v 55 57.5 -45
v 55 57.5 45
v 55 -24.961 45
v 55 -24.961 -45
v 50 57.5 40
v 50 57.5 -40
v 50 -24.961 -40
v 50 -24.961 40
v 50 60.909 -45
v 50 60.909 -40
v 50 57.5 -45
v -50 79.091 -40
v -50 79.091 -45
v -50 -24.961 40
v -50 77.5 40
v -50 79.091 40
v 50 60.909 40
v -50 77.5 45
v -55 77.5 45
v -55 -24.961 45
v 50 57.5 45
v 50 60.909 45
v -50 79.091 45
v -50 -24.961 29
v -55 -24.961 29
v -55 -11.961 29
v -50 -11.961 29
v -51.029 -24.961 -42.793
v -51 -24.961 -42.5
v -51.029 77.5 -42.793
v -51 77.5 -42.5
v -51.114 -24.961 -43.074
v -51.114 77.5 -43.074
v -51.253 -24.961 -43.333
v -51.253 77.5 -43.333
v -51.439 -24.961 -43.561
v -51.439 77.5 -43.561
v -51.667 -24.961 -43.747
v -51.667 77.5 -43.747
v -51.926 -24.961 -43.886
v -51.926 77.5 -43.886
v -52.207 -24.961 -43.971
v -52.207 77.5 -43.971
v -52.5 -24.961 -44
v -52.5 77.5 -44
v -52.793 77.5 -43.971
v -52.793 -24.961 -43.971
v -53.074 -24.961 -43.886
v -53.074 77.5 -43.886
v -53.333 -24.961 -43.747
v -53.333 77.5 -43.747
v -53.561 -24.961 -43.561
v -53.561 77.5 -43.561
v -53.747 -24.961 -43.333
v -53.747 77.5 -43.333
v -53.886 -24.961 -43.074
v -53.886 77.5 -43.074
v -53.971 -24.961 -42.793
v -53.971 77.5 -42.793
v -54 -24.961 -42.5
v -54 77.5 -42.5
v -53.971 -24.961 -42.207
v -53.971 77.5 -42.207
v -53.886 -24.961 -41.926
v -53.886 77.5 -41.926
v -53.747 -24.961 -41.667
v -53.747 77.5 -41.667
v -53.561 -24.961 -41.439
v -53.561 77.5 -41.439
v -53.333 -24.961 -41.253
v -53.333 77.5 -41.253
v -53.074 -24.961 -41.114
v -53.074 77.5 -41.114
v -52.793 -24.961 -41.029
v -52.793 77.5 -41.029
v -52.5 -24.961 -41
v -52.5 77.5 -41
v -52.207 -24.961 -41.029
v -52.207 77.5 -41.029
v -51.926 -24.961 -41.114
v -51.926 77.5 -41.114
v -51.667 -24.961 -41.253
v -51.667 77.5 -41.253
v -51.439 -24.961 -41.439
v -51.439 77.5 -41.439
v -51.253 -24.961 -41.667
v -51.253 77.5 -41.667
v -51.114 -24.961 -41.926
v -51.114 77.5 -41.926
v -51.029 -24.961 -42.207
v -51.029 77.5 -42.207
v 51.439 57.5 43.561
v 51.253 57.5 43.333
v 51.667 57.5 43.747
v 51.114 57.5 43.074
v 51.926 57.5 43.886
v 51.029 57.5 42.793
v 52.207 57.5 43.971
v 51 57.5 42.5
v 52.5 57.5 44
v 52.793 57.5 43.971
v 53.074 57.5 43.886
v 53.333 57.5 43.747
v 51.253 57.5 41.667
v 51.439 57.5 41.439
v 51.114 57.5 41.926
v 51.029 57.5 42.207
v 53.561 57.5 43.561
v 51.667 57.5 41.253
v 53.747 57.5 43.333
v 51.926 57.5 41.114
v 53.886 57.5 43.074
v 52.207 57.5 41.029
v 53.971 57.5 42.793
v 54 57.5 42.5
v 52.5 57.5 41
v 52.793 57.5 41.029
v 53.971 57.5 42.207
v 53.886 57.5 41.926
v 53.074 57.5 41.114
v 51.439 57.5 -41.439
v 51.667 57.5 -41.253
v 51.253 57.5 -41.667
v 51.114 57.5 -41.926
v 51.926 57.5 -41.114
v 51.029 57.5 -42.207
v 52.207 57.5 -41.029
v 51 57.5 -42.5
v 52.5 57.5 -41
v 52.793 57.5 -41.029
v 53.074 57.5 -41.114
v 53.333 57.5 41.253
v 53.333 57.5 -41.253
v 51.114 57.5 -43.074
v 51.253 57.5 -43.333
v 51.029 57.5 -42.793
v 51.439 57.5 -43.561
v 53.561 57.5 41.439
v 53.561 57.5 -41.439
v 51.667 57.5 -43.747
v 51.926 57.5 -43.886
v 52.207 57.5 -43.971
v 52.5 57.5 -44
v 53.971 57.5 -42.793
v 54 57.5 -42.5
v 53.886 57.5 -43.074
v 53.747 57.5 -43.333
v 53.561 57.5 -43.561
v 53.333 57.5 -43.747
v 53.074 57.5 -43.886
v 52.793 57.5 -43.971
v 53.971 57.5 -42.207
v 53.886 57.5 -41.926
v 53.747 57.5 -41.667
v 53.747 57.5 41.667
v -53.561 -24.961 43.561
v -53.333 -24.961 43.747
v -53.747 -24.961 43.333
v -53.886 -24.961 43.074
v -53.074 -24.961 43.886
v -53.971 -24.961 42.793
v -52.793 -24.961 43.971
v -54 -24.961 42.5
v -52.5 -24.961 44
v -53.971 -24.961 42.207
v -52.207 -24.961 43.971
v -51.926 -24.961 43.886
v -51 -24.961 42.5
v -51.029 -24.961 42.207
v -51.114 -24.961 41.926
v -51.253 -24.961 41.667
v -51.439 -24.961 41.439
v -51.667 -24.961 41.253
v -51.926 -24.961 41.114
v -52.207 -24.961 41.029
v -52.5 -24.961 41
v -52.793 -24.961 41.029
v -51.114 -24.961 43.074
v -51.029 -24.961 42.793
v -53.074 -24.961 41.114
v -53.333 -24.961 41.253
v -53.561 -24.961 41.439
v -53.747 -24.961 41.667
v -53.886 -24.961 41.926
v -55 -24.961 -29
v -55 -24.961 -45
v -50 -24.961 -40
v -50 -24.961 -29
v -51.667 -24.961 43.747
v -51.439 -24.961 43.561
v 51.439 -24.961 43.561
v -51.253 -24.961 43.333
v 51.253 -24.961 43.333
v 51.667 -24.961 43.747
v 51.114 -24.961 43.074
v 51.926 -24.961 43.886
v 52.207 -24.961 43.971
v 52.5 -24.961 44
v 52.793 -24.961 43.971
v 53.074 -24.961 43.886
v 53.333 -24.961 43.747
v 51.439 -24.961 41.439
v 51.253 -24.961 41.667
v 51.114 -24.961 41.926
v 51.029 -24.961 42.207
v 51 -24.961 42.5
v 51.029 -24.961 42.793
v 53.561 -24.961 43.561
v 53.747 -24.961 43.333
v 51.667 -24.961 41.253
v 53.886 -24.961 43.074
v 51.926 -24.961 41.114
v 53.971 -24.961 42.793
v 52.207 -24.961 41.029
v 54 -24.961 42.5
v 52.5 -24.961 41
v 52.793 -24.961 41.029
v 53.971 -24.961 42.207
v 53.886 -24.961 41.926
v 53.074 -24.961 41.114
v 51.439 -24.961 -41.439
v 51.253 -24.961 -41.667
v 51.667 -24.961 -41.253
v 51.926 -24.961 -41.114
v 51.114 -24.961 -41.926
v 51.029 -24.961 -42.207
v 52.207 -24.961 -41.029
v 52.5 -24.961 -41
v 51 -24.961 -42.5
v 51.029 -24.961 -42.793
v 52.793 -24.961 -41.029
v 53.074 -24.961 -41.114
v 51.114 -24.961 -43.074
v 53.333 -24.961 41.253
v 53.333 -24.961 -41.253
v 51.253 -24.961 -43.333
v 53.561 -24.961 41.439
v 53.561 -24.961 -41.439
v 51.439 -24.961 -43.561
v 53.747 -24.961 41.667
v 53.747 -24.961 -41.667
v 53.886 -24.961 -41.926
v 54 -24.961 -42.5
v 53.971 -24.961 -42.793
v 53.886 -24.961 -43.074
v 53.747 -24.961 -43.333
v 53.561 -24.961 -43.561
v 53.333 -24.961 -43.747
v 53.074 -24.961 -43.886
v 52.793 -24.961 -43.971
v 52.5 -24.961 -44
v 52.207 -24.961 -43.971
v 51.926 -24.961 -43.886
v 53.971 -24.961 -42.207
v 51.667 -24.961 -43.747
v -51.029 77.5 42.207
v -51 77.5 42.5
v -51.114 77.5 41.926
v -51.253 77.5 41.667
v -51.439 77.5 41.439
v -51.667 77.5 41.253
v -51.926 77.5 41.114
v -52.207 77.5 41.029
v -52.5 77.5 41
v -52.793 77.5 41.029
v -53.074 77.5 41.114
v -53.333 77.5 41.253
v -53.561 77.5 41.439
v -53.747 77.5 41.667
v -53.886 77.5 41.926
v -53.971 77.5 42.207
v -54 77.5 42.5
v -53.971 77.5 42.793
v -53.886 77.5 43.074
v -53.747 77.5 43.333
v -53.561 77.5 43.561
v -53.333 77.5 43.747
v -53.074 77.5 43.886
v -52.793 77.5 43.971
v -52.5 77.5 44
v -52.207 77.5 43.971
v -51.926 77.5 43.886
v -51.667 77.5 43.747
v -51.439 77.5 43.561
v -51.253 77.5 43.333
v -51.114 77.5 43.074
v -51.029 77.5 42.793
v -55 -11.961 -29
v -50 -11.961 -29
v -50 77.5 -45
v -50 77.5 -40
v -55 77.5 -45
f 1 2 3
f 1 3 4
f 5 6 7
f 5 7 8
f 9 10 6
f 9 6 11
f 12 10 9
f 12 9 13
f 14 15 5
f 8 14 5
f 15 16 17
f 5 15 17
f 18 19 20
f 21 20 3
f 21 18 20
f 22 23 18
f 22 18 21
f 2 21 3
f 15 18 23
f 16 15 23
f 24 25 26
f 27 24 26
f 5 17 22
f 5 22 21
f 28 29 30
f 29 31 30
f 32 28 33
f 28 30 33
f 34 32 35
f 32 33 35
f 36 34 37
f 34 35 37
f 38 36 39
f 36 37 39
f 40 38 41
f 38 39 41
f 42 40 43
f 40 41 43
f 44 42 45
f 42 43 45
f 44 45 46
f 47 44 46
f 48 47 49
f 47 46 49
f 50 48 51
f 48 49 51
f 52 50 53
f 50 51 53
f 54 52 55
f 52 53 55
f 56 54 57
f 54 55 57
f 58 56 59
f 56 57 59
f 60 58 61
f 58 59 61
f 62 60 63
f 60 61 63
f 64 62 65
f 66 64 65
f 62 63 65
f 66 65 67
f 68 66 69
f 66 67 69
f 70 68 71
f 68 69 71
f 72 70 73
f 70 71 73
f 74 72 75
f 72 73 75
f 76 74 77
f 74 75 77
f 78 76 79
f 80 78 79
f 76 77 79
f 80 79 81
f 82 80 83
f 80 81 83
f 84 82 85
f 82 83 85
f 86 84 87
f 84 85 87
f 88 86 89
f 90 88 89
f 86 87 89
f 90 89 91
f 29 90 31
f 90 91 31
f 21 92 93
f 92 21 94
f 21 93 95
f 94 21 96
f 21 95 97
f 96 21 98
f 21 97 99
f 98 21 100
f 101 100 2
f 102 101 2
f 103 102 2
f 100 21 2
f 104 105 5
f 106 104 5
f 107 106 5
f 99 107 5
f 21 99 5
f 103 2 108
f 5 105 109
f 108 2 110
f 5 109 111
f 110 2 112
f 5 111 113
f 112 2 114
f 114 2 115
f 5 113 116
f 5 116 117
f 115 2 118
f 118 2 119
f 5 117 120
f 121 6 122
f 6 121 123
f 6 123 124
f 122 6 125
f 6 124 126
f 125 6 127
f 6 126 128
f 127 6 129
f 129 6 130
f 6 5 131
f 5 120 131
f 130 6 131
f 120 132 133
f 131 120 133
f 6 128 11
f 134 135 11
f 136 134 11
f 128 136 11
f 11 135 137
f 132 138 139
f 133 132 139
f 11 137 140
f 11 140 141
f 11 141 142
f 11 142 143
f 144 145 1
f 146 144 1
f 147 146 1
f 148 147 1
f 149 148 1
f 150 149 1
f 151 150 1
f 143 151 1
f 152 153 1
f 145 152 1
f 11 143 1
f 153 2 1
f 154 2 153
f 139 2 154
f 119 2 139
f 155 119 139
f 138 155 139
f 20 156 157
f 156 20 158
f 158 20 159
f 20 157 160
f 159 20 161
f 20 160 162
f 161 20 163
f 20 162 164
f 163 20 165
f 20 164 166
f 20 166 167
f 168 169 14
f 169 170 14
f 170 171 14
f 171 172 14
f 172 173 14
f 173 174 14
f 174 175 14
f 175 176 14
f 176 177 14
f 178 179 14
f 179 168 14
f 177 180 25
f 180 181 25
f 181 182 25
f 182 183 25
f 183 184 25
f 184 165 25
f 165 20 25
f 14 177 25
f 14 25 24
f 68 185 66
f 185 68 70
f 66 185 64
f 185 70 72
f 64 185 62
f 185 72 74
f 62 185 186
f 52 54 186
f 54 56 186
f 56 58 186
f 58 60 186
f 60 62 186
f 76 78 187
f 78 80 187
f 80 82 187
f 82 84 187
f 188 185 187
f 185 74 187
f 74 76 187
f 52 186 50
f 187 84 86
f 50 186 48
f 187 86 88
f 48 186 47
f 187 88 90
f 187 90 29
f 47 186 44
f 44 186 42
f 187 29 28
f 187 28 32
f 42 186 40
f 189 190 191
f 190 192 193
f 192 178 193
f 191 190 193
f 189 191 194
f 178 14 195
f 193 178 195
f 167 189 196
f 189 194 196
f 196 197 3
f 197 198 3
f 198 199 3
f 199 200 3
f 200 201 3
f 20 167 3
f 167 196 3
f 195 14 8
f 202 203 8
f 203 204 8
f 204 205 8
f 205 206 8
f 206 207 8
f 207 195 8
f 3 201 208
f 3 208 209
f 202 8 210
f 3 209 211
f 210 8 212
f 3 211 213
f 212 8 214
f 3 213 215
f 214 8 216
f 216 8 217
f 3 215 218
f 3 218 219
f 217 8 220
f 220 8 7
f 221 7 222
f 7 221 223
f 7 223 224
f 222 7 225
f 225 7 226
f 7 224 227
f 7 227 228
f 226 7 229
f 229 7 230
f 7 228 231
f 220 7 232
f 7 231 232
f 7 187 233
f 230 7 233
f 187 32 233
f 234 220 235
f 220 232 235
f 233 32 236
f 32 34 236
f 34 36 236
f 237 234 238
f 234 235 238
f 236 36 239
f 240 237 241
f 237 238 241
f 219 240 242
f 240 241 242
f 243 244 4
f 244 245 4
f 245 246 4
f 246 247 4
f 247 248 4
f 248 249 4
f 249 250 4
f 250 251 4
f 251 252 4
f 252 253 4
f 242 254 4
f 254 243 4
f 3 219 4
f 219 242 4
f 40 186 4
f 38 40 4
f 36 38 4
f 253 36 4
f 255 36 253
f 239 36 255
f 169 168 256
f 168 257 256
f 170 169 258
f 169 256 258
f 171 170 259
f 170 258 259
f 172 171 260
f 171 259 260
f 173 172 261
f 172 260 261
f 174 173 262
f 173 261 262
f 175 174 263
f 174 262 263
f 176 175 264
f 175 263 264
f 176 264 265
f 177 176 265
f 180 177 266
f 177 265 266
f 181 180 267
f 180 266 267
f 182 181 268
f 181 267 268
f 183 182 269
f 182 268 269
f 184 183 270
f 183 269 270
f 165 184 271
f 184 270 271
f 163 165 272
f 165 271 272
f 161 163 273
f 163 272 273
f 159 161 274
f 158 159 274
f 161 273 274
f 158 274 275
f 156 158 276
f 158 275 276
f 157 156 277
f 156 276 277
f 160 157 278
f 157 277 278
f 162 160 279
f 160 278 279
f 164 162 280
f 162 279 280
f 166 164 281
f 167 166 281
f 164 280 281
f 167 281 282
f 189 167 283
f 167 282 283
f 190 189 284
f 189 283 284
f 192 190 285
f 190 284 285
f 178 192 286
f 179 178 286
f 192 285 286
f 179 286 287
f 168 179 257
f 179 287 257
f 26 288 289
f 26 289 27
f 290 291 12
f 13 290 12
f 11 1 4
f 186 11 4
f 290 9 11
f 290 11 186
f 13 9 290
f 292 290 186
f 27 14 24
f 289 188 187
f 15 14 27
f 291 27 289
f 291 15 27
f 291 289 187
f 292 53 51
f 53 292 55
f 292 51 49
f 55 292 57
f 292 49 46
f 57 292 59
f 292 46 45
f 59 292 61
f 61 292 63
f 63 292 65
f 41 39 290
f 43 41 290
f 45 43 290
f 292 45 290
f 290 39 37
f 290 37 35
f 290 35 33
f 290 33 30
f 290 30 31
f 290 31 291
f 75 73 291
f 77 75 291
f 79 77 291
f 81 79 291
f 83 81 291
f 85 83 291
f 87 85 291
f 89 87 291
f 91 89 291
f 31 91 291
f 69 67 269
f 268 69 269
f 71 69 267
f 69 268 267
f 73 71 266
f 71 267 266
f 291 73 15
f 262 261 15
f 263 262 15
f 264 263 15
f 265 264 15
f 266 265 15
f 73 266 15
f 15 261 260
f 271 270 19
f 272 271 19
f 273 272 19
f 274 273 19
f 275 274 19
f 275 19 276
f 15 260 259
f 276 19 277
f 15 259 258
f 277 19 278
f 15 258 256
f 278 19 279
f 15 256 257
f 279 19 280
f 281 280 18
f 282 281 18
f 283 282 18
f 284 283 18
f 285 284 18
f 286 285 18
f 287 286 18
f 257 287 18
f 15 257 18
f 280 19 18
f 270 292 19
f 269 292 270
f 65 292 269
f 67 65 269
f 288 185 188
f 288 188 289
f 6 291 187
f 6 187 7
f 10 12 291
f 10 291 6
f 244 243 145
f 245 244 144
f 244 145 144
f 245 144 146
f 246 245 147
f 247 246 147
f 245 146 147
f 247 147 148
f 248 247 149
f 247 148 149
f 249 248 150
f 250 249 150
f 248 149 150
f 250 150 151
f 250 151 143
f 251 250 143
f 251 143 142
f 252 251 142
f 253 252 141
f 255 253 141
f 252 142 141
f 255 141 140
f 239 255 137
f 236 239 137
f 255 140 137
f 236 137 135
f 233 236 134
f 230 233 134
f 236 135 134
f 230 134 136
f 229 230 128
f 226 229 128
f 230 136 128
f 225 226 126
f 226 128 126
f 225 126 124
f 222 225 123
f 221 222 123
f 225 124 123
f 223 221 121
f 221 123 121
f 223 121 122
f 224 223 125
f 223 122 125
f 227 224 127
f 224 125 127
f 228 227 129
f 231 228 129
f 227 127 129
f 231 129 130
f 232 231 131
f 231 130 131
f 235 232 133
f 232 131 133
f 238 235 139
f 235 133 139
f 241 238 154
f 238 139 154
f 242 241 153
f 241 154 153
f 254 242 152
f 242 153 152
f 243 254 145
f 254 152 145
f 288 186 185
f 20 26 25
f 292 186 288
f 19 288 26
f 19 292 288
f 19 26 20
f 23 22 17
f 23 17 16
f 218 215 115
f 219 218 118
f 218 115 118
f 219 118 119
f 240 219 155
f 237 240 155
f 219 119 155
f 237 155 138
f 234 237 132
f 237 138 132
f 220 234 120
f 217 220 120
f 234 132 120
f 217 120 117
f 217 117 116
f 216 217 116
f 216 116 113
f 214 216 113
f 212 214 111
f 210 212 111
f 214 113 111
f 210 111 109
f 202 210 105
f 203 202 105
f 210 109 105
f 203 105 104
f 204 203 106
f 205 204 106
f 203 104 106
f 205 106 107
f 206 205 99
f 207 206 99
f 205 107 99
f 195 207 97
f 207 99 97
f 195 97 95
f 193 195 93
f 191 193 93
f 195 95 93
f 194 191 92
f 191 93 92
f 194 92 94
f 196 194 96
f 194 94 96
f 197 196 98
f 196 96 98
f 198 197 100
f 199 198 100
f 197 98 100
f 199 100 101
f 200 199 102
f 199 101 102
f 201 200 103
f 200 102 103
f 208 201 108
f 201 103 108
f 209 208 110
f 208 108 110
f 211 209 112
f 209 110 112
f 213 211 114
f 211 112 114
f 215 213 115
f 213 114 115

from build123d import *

# Parameters (mm, degrees)
BOSS_EXTRUDE3_DEPTH      = 80
BOSS_EXTRUDE3_DEPTH_BACK = 24.960779397
SKETCH1_W                = 110
SKETCH1_H                = 90
SKETCH1_W_2              = 100
SKETCH1_H_2              = 80
SKETCH2_R                = 1.5
CUT_EXTRUDE1_DEPTH       = 80
SKETCH3_R                = 1.5
CUT_EXTRUDE2_DEPTH       = 80
SKETCH4_R                = 1.5
CUT_EXTRUDE3_DEPTH       = 80
SKETCH5_R                = 1.5
CUT_EXTRUDE4_DEPTH       = 80
CUT_EXTRUDE5_DEPTH       = 90
SKETCH7_W                = 90
SKETCH7_H                = 2.5
CUT_EXTRUDE7_DEPTH       = 5
CUT_EXTRUDE8_DEPTH       = 90
CUT_EXTRUDE11_DEPTH      = 90
SKETCH4_3_R              = 1.5
CUT_EXTRUDE17_DEPTH      = 105
SKETCH5_3_R              = 1.5
CUT_EXTRUDE18_DEPTH      = 105
SKETCH3_3_R              = 1.5
CUT_EXTRUDE19_DEPTH      = 105
SKETCH2_3_R              = 1.5
CUT_EXTRUDE20_DEPTH      = 105
SKETCH20_W               = 58
SKETCH20_H               = 13
CUT_EXTRUDE21_DEPTH      = 5


with BuildPart() as part:
    # Sketch1 → Boss-Extrude3 (new, two sides: drawn at the far end of the back side and taken through both)
    with BuildSketch(Plane(origin=(0, 0, 0), x_dir=(1, 0, 0), z_dir=(0, 1, 0)).offset(-BOSS_EXTRUDE3_DEPTH_BACK)):
        Rectangle(SKETCH1_W, SKETCH1_H)
        Rectangle(SKETCH1_W_2, SKETCH1_H_2, mode=Mode.SUBTRACT)
    extrude(amount=BOSS_EXTRUDE3_DEPTH + BOSS_EXTRUDE3_DEPTH_BACK)

    # Sketch2 → Cut-Extrude1 (cut)
    with BuildSketch(Plane(origin=(0, 80, 0), x_dir=(1, 0, 0), z_dir=(0, 1, 0))):
        with Locations((-52.5, 42.5)):
            Circle(SKETCH2_R)
    extrude(amount=-CUT_EXTRUDE1_DEPTH, mode=Mode.SUBTRACT)

    # Sketch3 → Cut-Extrude2 (cut)
    with BuildSketch(Plane(origin=(0, 80, 0), x_dir=(1, 0, 0), z_dir=(0, 1, 0))):
        with Locations((52.5, 42.5)):
            Circle(SKETCH3_R)
    extrude(amount=-CUT_EXTRUDE2_DEPTH, mode=Mode.SUBTRACT)

    # Sketch4 → Cut-Extrude3 (cut)
    with BuildSketch(Plane(origin=(0, 80, 0), x_dir=(1, 0, 0), z_dir=(0, 1, 0))):
        with Locations((-52.5, -42.5)):
            Circle(SKETCH4_R)
    extrude(amount=-CUT_EXTRUDE3_DEPTH, mode=Mode.SUBTRACT)

    # Sketch5 → Cut-Extrude4 (cut)
    with BuildSketch(Plane(origin=(0, 80, 0), x_dir=(1, 0, 0), z_dir=(0, 1, 0))):
        with Locations((52.5, -42.5)):
            Circle(SKETCH5_R)
    extrude(amount=-CUT_EXTRUDE4_DEPTH, mode=Mode.SUBTRACT)

    # Sketch6 → Cut-Extrude5 (cut)
    with BuildSketch(Plane.XY.offset(45)):
        Polygon((-55, 80), (55, 80), (55, 60), align=None)
    extrude(amount=-CUT_EXTRUDE5_DEPTH, mode=Mode.SUBTRACT)

    # Sketch7 → Cut-Extrude7 (cut)
    with BuildSketch(Plane(origin=(55, 0, 0), x_dir=(0, 0, -1), z_dir=(1, 0, 0))):
        with Locations((0, 58.75)):
            Rectangle(SKETCH7_W, SKETCH7_H)
    extrude(amount=-CUT_EXTRUDE7_DEPTH, mode=Mode.SUBTRACT)

    # Sketch8 → Cut-Extrude8 (cut)
    with BuildSketch(Plane.XY.offset(45)):
        Polygon((50, 60), (55, 60), (50, 60.909090909), align=None)
    extrude(amount=-CUT_EXTRUDE8_DEPTH, mode=Mode.SUBTRACT)

    # Sketch9 → Cut-Extrude11 (cut)
    with BuildSketch(Plane.XY.offset(45)):
        Polygon((-55, 80), (-55, 77.5), (-50, 77.5), (-50, 79.090909091), align=None)
    extrude(amount=-CUT_EXTRUDE11_DEPTH, mode=Mode.SUBTRACT)

    # Sketch4<3> → Cut-Extrude17 (cut)
    with BuildSketch(Plane(origin=(0, 80, 0), x_dir=(1, 0, 0), z_dir=(0, 1, 0))):
        with Locations((-52.5, -42.5)):
            Circle(SKETCH4_3_R)
    extrude(amount=-CUT_EXTRUDE17_DEPTH, mode=Mode.SUBTRACT)

    # Sketch5<3> → Cut-Extrude18 (cut)
    with BuildSketch(Plane(origin=(0, 80, 0), x_dir=(1, 0, 0), z_dir=(0, 1, 0))):
        with Locations((52.5, -42.5)):
            Circle(SKETCH5_3_R)
    extrude(amount=-CUT_EXTRUDE18_DEPTH, mode=Mode.SUBTRACT)

    # Sketch3<3> → Cut-Extrude19 (cut)
    with BuildSketch(Plane(origin=(0, 80, 0), x_dir=(1, 0, 0), z_dir=(0, 1, 0))):
        with Locations((52.5, 42.5)):
            Circle(SKETCH3_3_R)
    extrude(amount=-CUT_EXTRUDE19_DEPTH, mode=Mode.SUBTRACT)

    # Sketch2<3> → Cut-Extrude20 (cut)
    with BuildSketch(Plane(origin=(0, 80, 0), x_dir=(1, 0, 0), z_dir=(0, 1, 0))):
        with Locations((-52.5, 42.5)):
            Circle(SKETCH2_3_R)
    extrude(amount=-CUT_EXTRUDE20_DEPTH, mode=Mode.SUBTRACT)

    # Sketch20 → Cut-Extrude21 (cut)
    with BuildSketch(Plane.ZY.offset(55)):
        with Locations((0, -18.460779397)):
            Rectangle(SKETCH20_W, SKETCH20_H)
    extrude(amount=-CUT_EXTRUDE21_DEPTH, mode=Mode.SUBTRACT)


solid = part.part
